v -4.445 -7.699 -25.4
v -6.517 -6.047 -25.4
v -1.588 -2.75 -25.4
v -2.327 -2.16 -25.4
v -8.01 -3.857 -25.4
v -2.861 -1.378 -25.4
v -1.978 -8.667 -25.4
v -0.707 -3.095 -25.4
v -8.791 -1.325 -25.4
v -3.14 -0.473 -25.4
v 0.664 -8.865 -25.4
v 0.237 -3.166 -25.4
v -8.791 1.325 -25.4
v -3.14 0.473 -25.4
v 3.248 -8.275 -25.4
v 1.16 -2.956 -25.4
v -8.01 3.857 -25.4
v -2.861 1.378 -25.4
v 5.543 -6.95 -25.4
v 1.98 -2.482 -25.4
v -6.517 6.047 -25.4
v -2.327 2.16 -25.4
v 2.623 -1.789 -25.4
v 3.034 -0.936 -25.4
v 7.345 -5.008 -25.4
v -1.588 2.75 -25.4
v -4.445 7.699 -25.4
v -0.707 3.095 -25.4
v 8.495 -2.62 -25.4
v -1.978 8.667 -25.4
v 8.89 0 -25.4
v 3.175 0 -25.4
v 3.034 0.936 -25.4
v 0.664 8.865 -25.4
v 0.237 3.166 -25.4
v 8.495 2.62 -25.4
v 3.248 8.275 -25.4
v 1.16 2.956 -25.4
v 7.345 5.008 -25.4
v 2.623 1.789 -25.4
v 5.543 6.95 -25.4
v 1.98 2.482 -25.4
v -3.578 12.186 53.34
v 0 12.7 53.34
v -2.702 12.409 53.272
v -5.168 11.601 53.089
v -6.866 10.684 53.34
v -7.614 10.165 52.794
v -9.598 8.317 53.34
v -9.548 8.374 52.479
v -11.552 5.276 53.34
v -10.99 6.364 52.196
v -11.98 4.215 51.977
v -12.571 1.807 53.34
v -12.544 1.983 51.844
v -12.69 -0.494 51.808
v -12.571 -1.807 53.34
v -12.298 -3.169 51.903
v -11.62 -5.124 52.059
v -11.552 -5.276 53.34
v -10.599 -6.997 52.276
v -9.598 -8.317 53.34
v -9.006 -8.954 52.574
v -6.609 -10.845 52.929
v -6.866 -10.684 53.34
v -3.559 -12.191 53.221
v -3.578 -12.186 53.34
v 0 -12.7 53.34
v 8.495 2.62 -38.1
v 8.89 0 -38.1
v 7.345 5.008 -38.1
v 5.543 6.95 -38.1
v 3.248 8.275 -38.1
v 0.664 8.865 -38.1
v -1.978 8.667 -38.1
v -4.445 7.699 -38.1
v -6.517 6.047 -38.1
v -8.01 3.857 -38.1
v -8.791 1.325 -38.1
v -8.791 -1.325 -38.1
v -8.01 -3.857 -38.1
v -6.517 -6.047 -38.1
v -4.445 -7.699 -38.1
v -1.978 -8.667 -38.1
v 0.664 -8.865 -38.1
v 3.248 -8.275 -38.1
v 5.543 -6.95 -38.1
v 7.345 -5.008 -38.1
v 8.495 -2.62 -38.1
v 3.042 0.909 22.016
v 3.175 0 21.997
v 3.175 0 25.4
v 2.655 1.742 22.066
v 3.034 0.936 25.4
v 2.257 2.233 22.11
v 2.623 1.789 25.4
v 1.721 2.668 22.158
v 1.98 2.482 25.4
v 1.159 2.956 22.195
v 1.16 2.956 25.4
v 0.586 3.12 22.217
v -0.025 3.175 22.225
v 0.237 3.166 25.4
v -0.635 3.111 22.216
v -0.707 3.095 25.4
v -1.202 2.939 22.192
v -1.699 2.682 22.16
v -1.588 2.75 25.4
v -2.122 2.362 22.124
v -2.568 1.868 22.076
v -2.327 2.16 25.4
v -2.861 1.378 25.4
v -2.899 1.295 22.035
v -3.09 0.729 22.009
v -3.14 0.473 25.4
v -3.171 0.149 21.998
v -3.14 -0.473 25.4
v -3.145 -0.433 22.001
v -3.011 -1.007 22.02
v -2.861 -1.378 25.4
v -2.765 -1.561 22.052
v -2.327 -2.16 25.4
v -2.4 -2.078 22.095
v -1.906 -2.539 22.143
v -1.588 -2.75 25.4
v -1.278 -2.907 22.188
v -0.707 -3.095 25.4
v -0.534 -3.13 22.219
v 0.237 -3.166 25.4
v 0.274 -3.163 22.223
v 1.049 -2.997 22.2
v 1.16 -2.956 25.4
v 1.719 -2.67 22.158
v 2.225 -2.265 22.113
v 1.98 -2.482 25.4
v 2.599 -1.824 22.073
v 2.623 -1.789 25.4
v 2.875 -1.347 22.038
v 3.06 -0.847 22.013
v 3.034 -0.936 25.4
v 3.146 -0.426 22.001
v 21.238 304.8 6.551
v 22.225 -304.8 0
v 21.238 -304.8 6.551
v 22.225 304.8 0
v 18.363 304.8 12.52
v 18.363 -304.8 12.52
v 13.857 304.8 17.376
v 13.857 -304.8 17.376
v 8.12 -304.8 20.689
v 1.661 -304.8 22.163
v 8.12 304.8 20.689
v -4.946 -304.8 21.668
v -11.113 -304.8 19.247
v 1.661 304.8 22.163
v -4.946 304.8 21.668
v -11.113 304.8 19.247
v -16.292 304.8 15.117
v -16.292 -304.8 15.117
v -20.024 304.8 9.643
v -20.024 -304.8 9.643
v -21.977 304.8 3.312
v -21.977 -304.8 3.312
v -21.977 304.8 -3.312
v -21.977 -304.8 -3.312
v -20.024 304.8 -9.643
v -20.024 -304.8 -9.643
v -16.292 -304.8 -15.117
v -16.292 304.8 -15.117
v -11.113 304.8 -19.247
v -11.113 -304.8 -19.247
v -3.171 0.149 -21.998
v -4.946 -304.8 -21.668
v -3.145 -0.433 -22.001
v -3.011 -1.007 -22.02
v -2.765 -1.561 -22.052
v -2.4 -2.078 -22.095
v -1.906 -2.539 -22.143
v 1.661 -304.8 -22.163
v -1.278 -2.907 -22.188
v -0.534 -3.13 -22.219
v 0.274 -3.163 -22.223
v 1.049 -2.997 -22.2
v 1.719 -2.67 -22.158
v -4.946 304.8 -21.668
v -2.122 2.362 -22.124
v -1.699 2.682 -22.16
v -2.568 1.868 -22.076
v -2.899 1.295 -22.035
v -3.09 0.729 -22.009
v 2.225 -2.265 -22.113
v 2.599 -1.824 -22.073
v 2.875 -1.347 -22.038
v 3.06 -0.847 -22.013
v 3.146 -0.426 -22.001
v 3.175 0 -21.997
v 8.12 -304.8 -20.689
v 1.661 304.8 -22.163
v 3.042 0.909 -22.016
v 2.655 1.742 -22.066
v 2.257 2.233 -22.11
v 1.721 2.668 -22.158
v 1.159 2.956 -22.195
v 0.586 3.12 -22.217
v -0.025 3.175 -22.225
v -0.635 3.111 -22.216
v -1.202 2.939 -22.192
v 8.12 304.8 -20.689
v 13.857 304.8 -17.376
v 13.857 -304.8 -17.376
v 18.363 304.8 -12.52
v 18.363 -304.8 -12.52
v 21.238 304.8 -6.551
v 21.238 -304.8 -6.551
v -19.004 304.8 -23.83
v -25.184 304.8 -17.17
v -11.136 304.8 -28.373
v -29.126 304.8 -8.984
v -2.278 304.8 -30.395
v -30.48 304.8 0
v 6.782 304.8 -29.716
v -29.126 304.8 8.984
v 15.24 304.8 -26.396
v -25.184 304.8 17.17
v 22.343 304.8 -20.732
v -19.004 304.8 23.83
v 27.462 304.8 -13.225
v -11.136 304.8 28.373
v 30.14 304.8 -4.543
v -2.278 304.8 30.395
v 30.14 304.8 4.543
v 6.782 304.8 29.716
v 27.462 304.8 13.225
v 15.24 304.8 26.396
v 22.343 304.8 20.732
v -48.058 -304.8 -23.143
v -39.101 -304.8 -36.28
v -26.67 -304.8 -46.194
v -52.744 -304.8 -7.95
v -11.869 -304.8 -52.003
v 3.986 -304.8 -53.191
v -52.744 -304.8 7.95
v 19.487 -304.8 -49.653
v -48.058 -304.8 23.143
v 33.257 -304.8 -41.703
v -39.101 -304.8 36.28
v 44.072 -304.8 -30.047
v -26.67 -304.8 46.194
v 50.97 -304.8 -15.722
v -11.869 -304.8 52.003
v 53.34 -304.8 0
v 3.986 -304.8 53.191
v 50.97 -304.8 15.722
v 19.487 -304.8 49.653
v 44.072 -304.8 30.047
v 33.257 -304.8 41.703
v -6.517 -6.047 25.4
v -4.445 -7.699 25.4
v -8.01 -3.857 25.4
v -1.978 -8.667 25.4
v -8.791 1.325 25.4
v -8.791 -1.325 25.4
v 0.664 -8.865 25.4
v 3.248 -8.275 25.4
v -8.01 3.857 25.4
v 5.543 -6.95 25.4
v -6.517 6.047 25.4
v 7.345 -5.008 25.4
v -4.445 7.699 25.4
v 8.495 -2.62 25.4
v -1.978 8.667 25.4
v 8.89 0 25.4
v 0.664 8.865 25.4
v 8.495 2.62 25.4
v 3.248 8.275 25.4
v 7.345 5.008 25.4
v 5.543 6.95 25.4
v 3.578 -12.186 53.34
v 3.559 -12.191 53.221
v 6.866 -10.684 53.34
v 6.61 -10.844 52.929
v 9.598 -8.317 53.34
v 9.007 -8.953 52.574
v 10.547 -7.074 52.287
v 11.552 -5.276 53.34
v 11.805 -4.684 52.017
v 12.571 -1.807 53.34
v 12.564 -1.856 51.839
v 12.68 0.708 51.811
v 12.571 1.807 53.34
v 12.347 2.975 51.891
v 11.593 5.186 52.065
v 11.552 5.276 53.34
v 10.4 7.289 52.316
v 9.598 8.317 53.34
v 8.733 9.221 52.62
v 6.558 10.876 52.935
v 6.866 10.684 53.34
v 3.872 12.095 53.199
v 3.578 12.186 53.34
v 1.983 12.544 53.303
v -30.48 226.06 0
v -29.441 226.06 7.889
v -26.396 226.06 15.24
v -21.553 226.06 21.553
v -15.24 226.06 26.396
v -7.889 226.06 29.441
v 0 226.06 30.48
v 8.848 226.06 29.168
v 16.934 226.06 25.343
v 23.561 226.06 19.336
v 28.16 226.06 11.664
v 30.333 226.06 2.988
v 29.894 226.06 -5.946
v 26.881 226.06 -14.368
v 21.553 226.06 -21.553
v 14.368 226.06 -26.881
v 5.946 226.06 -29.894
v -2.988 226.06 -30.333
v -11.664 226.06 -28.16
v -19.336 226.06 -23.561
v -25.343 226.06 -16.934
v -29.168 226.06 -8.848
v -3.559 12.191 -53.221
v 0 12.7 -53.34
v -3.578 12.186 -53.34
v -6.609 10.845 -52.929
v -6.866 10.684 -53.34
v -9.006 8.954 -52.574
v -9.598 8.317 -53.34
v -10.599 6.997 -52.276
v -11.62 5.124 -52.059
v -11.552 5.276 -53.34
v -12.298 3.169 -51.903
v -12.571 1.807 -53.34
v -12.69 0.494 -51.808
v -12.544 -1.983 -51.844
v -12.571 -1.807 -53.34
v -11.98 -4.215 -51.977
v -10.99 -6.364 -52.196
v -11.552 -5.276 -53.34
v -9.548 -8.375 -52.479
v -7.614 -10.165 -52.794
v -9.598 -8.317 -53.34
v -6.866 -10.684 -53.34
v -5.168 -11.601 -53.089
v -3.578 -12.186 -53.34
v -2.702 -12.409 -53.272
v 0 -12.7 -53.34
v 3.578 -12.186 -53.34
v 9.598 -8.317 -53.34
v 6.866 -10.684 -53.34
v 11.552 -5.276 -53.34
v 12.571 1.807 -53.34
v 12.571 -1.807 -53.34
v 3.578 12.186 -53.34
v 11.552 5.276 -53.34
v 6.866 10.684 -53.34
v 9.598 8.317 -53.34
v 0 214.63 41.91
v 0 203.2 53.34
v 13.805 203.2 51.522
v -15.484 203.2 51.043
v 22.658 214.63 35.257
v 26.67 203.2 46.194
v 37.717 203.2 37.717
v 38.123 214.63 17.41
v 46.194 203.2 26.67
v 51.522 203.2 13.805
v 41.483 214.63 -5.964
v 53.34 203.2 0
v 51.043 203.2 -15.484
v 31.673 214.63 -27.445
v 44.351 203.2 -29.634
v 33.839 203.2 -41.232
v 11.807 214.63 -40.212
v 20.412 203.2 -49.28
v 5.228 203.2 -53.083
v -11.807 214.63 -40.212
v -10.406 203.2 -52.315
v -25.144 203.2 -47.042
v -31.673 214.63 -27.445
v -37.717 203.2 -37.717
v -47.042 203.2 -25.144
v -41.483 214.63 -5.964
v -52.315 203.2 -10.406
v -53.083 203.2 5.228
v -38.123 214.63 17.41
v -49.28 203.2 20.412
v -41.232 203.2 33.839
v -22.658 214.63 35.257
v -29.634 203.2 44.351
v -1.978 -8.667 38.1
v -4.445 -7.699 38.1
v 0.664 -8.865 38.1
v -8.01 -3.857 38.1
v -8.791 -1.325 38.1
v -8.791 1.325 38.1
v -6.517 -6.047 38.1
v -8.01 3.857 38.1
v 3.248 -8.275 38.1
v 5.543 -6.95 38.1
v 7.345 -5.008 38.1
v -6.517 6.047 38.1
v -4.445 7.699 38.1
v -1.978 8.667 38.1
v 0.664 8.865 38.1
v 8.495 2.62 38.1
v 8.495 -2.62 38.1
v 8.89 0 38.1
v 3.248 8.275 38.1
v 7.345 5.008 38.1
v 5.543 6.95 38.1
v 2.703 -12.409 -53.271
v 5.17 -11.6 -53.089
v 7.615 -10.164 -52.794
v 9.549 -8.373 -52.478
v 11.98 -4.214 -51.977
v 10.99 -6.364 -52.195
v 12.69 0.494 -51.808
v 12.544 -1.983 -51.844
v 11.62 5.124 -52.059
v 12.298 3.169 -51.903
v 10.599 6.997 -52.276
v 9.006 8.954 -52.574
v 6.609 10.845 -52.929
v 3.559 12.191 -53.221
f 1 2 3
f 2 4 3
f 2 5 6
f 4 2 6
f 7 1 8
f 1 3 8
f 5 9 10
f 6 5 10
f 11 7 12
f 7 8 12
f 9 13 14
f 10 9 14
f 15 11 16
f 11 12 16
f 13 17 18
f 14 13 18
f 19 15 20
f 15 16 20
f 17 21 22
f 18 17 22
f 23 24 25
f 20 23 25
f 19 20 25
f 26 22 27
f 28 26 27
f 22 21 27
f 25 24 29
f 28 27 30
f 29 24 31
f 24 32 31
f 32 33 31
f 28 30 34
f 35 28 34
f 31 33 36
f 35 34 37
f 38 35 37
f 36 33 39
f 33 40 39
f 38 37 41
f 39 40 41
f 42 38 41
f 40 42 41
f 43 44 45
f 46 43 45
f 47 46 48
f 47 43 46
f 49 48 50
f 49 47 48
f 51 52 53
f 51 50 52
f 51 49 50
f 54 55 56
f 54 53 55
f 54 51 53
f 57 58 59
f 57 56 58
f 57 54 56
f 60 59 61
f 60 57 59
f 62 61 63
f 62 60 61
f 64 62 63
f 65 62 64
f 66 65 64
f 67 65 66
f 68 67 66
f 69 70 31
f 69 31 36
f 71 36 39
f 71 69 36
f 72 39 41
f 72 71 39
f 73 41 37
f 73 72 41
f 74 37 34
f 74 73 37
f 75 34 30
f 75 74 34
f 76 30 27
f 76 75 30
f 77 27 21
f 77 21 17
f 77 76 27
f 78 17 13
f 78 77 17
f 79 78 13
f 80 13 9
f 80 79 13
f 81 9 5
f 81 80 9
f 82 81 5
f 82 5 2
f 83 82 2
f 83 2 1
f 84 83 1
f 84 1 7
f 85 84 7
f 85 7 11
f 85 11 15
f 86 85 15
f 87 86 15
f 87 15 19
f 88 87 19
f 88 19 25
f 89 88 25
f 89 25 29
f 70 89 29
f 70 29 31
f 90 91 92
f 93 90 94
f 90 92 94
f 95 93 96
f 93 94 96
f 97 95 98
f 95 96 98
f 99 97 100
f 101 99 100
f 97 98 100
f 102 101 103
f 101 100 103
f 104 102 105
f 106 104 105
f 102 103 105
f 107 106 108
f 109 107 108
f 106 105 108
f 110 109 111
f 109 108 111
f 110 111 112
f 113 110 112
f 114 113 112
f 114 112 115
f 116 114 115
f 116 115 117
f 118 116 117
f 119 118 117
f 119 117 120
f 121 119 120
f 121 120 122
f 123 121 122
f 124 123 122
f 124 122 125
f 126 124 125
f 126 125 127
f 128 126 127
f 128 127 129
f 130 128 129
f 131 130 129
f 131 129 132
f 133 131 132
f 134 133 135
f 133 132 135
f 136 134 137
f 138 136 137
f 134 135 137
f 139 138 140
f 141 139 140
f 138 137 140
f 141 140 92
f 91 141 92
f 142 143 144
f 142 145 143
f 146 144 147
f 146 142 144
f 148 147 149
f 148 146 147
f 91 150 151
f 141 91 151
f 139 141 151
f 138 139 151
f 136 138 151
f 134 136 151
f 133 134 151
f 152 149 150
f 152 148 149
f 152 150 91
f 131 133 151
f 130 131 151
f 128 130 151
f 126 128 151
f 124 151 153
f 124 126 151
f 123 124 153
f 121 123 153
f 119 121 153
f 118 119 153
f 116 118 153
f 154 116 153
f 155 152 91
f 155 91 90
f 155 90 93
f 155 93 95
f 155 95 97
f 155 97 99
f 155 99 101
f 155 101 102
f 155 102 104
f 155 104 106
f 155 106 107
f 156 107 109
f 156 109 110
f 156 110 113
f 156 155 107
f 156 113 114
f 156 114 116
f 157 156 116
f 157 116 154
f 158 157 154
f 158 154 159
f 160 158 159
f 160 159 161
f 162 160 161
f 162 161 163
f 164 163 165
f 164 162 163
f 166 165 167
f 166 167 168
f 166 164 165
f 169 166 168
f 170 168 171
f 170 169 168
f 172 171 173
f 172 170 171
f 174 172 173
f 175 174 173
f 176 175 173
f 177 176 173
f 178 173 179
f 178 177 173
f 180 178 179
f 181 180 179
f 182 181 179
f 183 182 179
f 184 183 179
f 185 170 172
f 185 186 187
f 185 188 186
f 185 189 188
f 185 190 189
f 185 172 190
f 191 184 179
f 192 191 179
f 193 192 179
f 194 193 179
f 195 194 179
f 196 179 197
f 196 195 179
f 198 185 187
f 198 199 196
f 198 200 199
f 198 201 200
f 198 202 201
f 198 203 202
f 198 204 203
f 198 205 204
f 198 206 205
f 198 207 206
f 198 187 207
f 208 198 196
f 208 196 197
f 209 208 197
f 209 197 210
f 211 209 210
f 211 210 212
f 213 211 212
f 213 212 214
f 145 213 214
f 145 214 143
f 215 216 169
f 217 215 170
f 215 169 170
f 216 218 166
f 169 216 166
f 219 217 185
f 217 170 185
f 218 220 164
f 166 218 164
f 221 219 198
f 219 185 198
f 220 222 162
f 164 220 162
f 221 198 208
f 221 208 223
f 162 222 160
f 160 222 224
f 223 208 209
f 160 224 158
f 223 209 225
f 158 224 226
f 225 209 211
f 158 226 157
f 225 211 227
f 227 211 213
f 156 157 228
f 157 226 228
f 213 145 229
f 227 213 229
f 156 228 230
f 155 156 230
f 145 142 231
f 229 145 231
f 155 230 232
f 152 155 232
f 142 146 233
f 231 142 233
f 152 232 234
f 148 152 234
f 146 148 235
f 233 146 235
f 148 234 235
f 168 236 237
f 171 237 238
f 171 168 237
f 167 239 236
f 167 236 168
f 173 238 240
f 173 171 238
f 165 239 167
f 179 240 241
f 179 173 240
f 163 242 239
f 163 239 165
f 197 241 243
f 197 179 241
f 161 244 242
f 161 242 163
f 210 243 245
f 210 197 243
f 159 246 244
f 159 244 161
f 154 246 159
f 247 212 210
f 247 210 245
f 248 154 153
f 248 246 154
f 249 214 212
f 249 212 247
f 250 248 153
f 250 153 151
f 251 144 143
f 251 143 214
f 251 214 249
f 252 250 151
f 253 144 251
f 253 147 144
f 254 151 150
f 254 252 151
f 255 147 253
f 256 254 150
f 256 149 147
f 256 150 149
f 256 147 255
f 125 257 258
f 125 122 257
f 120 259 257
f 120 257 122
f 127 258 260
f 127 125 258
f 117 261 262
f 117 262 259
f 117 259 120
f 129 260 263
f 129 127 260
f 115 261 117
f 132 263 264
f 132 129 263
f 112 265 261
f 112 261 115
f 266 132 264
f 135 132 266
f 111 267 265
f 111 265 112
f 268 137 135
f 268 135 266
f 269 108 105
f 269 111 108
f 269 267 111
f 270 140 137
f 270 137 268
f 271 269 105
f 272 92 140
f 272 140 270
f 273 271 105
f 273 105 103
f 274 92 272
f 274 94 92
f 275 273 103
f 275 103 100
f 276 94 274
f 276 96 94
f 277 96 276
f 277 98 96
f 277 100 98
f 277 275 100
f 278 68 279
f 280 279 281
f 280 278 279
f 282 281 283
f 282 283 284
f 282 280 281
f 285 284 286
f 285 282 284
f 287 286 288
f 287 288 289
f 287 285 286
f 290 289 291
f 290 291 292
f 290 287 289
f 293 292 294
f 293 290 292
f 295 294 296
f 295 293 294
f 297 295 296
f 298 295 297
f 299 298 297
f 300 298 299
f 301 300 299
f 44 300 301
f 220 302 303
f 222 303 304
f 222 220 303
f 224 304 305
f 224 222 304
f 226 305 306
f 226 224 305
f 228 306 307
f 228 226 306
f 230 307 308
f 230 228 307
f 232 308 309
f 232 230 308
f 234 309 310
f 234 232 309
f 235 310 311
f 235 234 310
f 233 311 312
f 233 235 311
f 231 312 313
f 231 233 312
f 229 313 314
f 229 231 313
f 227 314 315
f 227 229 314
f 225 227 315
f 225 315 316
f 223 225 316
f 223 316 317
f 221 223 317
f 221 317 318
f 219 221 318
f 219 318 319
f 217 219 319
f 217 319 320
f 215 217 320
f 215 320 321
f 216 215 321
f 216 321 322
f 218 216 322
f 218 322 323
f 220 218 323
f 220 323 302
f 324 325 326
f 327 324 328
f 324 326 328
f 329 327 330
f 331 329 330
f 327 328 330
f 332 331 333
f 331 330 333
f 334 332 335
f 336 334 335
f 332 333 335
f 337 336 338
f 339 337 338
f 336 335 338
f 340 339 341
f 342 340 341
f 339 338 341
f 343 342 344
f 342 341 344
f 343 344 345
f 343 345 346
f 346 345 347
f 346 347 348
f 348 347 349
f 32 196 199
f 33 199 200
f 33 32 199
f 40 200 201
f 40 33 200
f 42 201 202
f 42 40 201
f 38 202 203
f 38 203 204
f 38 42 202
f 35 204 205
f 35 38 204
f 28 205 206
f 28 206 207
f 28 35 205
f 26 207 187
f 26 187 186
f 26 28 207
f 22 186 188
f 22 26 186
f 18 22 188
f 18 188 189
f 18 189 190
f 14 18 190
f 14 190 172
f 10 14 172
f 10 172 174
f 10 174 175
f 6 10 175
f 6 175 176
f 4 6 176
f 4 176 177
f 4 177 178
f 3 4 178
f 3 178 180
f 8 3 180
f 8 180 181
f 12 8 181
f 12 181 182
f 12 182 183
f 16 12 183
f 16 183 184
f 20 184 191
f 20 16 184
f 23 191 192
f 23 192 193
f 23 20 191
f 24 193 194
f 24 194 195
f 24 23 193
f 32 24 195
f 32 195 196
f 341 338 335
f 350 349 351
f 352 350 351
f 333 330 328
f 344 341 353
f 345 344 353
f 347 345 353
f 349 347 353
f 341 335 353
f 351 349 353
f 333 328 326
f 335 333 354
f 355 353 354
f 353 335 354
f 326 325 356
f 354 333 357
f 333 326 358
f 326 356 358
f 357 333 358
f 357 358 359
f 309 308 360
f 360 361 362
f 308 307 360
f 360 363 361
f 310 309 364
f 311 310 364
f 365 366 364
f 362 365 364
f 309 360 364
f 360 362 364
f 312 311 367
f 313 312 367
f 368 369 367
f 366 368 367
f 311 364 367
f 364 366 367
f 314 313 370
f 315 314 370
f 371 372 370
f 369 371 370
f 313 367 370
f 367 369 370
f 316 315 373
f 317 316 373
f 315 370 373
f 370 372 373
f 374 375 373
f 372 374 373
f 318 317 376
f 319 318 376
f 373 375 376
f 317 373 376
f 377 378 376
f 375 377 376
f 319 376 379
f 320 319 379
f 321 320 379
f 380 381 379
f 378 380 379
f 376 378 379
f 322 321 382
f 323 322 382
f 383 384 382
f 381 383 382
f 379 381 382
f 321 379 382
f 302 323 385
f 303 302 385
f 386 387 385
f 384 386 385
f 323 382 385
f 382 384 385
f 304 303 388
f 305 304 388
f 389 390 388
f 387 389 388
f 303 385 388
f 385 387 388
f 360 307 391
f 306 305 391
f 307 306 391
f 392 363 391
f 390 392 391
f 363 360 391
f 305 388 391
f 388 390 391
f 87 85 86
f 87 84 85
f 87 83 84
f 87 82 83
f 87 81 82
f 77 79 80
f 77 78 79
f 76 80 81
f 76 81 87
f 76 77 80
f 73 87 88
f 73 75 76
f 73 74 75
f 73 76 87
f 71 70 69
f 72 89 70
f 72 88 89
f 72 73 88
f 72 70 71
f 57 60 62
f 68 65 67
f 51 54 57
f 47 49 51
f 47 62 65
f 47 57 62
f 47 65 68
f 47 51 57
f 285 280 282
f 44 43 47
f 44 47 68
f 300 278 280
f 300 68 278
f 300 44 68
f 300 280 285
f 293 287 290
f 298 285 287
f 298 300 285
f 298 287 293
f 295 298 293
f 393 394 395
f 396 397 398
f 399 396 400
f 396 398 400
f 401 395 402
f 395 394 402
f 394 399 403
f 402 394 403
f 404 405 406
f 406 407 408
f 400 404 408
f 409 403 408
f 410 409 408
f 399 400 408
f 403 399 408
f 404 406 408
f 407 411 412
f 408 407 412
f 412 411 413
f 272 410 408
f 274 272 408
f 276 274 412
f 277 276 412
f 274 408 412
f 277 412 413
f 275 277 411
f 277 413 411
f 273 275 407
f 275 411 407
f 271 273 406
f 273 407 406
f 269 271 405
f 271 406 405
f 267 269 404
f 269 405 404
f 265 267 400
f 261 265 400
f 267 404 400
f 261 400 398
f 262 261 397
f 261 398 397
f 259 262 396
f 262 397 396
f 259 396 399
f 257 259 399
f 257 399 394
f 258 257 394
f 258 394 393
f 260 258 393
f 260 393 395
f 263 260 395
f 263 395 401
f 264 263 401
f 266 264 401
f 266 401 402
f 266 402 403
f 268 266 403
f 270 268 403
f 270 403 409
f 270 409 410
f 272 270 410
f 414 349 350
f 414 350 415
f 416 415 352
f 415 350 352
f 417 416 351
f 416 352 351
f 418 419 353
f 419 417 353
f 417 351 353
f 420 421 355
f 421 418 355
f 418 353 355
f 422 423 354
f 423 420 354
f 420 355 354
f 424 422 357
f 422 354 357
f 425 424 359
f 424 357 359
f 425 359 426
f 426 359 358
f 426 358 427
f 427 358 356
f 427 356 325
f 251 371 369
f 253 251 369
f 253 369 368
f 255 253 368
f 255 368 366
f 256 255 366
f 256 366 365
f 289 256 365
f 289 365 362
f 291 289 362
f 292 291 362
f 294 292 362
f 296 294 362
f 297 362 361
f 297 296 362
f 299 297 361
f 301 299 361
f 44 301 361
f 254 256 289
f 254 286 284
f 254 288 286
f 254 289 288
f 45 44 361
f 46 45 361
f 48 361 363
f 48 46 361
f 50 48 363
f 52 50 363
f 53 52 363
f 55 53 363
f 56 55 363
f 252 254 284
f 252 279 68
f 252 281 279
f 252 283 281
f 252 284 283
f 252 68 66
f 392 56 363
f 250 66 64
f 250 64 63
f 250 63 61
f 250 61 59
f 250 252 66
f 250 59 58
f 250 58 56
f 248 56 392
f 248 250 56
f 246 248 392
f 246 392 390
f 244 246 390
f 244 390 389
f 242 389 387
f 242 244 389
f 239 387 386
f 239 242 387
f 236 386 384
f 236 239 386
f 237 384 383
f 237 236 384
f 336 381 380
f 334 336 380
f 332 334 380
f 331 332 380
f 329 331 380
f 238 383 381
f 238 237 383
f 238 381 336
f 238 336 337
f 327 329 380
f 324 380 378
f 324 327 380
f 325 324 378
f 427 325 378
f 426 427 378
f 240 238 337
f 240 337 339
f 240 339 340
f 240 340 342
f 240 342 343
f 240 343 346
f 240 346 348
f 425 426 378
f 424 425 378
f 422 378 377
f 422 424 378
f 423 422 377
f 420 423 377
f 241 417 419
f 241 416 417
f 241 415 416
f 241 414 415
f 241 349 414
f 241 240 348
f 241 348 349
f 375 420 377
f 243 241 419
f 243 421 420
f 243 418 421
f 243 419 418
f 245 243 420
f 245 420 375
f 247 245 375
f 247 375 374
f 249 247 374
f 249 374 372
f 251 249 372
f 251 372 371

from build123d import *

# Parameters (mm, degrees)
F0_R      = 53.34
F0_R_2    = 22.225
F1_DEPTH  = 304.8
F4_R      = 53.34
F4_R_2    = 30.48
F5_DEPTH  = 101.6
F10_R     = 12.7
F10_R_2   = 8.89
F10_R_3   = 3.175
F11_DEPTH = 15.24
F12_DEPTH = 27.94
F13_DEPTH = 32.3429548439
F14_R     = 12.7
F14_R_2   = 8.89
F14_R_3   = 3.175
F15_DEPTH = 15.24
F16_DEPTH = 27.94
F17_DEPTH = 32.3429548439
F18_R     = 12.7
F19_DEPTH = 15.24
F20_R     = 12.7
F21_DEPTH = 15.24


with BuildPart() as f1:
    # F0 (on Front) → F1 (new body, symmetric)
    with BuildSketch(Plane.XZ):
        Circle(F0_R)
        Circle(F0_R_2, mode=Mode.SUBTRACT)
    extrude(amount=F1_DEPTH, both=True)

    # F4 (on offset) → F5 (cut)
    with BuildSketch(Plane(origin=(0, 304.8, 0), x_dir=(-1, 0, 0), z_dir=(0, 1, 0))):
        Circle(F4_R)
        Circle(F4_R_2, mode=Mode.SUBTRACT)
    extrude(amount=-F5_DEPTH, mode=Mode.SUBTRACT)

    # F6 (on Right) → F7 (revolve)
    with BuildSketch(Plane.YZ):
        Polygon((203.2, 53.34), (203.2, 30.48), (226.06, 30.48), align=None)
    revolve(axis=Axis((0, 101.6, 0), (0, 1, 0)))

    # F10 (on offset) → F11 (cut)
    with BuildSketch(Plane.XY.offset(53.34)):
        Circle(F10_R)
        Circle(F10_R_2, mode=Mode.SUBTRACT)
        Circle(F10_R_2)
        Circle(F10_R_3, mode=Mode.SUBTRACT)
        Circle(F10_R_3)
    extrude(amount=-F11_DEPTH, mode=Mode.SUBTRACT)

    # F10 (on offset) → F12 (cut)
    with BuildSketch(Plane.XY.offset(53.34)):
        Circle(F10_R_2)
        Circle(F10_R_3, mode=Mode.SUBTRACT)
        Circle(F10_R_3)
    extrude(amount=-F12_DEPTH, mode=Mode.SUBTRACT)

    # F10 (on offset) → F13 (cut, up to face)
    with BuildSketch(Plane.XY.offset(53.34)):
        Circle(F10_R_3)
    extrude(amount=-F13_DEPTH, mode=Mode.SUBTRACT)

    # F14 (on offset) → F15 (cut)
    with BuildSketch(Plane.XY.offset(-53.34)):
        Circle(F14_R)
        Circle(F14_R_2, mode=Mode.SUBTRACT)
        Circle(F14_R_2)
        Circle(F14_R_3, mode=Mode.SUBTRACT)
        Circle(F14_R_3)
    extrude(amount=F15_DEPTH, mode=Mode.SUBTRACT)

    # F14 (on offset) → F16 (cut)
    with BuildSketch(Plane.XY.offset(-53.34)):
        Circle(F14_R_2)
        Circle(F14_R_3, mode=Mode.SUBTRACT)
        Circle(F14_R_3)
    extrude(amount=F16_DEPTH, mode=Mode.SUBTRACT)

    # F14 (on offset) → F17 (cut, up to face)
    with BuildSketch(Plane.XY.offset(-53.34)):
        Circle(F14_R_3)
    extrude(amount=F17_DEPTH, mode=Mode.SUBTRACT)

    # F18 (on offset) → F19 (join, through all)
    with BuildSketch(Plane.XY.offset(53.34)):
        Circle(F18_R)
    extrude(amount=-F19_DEPTH)

    # F20 (on offset) → F21 (join, through all)
    with BuildSketch(Plane.XY.offset(-53.34)):
        Circle(F20_R)
    extrude(amount=F21_DEPTH)


solid = f1.part
